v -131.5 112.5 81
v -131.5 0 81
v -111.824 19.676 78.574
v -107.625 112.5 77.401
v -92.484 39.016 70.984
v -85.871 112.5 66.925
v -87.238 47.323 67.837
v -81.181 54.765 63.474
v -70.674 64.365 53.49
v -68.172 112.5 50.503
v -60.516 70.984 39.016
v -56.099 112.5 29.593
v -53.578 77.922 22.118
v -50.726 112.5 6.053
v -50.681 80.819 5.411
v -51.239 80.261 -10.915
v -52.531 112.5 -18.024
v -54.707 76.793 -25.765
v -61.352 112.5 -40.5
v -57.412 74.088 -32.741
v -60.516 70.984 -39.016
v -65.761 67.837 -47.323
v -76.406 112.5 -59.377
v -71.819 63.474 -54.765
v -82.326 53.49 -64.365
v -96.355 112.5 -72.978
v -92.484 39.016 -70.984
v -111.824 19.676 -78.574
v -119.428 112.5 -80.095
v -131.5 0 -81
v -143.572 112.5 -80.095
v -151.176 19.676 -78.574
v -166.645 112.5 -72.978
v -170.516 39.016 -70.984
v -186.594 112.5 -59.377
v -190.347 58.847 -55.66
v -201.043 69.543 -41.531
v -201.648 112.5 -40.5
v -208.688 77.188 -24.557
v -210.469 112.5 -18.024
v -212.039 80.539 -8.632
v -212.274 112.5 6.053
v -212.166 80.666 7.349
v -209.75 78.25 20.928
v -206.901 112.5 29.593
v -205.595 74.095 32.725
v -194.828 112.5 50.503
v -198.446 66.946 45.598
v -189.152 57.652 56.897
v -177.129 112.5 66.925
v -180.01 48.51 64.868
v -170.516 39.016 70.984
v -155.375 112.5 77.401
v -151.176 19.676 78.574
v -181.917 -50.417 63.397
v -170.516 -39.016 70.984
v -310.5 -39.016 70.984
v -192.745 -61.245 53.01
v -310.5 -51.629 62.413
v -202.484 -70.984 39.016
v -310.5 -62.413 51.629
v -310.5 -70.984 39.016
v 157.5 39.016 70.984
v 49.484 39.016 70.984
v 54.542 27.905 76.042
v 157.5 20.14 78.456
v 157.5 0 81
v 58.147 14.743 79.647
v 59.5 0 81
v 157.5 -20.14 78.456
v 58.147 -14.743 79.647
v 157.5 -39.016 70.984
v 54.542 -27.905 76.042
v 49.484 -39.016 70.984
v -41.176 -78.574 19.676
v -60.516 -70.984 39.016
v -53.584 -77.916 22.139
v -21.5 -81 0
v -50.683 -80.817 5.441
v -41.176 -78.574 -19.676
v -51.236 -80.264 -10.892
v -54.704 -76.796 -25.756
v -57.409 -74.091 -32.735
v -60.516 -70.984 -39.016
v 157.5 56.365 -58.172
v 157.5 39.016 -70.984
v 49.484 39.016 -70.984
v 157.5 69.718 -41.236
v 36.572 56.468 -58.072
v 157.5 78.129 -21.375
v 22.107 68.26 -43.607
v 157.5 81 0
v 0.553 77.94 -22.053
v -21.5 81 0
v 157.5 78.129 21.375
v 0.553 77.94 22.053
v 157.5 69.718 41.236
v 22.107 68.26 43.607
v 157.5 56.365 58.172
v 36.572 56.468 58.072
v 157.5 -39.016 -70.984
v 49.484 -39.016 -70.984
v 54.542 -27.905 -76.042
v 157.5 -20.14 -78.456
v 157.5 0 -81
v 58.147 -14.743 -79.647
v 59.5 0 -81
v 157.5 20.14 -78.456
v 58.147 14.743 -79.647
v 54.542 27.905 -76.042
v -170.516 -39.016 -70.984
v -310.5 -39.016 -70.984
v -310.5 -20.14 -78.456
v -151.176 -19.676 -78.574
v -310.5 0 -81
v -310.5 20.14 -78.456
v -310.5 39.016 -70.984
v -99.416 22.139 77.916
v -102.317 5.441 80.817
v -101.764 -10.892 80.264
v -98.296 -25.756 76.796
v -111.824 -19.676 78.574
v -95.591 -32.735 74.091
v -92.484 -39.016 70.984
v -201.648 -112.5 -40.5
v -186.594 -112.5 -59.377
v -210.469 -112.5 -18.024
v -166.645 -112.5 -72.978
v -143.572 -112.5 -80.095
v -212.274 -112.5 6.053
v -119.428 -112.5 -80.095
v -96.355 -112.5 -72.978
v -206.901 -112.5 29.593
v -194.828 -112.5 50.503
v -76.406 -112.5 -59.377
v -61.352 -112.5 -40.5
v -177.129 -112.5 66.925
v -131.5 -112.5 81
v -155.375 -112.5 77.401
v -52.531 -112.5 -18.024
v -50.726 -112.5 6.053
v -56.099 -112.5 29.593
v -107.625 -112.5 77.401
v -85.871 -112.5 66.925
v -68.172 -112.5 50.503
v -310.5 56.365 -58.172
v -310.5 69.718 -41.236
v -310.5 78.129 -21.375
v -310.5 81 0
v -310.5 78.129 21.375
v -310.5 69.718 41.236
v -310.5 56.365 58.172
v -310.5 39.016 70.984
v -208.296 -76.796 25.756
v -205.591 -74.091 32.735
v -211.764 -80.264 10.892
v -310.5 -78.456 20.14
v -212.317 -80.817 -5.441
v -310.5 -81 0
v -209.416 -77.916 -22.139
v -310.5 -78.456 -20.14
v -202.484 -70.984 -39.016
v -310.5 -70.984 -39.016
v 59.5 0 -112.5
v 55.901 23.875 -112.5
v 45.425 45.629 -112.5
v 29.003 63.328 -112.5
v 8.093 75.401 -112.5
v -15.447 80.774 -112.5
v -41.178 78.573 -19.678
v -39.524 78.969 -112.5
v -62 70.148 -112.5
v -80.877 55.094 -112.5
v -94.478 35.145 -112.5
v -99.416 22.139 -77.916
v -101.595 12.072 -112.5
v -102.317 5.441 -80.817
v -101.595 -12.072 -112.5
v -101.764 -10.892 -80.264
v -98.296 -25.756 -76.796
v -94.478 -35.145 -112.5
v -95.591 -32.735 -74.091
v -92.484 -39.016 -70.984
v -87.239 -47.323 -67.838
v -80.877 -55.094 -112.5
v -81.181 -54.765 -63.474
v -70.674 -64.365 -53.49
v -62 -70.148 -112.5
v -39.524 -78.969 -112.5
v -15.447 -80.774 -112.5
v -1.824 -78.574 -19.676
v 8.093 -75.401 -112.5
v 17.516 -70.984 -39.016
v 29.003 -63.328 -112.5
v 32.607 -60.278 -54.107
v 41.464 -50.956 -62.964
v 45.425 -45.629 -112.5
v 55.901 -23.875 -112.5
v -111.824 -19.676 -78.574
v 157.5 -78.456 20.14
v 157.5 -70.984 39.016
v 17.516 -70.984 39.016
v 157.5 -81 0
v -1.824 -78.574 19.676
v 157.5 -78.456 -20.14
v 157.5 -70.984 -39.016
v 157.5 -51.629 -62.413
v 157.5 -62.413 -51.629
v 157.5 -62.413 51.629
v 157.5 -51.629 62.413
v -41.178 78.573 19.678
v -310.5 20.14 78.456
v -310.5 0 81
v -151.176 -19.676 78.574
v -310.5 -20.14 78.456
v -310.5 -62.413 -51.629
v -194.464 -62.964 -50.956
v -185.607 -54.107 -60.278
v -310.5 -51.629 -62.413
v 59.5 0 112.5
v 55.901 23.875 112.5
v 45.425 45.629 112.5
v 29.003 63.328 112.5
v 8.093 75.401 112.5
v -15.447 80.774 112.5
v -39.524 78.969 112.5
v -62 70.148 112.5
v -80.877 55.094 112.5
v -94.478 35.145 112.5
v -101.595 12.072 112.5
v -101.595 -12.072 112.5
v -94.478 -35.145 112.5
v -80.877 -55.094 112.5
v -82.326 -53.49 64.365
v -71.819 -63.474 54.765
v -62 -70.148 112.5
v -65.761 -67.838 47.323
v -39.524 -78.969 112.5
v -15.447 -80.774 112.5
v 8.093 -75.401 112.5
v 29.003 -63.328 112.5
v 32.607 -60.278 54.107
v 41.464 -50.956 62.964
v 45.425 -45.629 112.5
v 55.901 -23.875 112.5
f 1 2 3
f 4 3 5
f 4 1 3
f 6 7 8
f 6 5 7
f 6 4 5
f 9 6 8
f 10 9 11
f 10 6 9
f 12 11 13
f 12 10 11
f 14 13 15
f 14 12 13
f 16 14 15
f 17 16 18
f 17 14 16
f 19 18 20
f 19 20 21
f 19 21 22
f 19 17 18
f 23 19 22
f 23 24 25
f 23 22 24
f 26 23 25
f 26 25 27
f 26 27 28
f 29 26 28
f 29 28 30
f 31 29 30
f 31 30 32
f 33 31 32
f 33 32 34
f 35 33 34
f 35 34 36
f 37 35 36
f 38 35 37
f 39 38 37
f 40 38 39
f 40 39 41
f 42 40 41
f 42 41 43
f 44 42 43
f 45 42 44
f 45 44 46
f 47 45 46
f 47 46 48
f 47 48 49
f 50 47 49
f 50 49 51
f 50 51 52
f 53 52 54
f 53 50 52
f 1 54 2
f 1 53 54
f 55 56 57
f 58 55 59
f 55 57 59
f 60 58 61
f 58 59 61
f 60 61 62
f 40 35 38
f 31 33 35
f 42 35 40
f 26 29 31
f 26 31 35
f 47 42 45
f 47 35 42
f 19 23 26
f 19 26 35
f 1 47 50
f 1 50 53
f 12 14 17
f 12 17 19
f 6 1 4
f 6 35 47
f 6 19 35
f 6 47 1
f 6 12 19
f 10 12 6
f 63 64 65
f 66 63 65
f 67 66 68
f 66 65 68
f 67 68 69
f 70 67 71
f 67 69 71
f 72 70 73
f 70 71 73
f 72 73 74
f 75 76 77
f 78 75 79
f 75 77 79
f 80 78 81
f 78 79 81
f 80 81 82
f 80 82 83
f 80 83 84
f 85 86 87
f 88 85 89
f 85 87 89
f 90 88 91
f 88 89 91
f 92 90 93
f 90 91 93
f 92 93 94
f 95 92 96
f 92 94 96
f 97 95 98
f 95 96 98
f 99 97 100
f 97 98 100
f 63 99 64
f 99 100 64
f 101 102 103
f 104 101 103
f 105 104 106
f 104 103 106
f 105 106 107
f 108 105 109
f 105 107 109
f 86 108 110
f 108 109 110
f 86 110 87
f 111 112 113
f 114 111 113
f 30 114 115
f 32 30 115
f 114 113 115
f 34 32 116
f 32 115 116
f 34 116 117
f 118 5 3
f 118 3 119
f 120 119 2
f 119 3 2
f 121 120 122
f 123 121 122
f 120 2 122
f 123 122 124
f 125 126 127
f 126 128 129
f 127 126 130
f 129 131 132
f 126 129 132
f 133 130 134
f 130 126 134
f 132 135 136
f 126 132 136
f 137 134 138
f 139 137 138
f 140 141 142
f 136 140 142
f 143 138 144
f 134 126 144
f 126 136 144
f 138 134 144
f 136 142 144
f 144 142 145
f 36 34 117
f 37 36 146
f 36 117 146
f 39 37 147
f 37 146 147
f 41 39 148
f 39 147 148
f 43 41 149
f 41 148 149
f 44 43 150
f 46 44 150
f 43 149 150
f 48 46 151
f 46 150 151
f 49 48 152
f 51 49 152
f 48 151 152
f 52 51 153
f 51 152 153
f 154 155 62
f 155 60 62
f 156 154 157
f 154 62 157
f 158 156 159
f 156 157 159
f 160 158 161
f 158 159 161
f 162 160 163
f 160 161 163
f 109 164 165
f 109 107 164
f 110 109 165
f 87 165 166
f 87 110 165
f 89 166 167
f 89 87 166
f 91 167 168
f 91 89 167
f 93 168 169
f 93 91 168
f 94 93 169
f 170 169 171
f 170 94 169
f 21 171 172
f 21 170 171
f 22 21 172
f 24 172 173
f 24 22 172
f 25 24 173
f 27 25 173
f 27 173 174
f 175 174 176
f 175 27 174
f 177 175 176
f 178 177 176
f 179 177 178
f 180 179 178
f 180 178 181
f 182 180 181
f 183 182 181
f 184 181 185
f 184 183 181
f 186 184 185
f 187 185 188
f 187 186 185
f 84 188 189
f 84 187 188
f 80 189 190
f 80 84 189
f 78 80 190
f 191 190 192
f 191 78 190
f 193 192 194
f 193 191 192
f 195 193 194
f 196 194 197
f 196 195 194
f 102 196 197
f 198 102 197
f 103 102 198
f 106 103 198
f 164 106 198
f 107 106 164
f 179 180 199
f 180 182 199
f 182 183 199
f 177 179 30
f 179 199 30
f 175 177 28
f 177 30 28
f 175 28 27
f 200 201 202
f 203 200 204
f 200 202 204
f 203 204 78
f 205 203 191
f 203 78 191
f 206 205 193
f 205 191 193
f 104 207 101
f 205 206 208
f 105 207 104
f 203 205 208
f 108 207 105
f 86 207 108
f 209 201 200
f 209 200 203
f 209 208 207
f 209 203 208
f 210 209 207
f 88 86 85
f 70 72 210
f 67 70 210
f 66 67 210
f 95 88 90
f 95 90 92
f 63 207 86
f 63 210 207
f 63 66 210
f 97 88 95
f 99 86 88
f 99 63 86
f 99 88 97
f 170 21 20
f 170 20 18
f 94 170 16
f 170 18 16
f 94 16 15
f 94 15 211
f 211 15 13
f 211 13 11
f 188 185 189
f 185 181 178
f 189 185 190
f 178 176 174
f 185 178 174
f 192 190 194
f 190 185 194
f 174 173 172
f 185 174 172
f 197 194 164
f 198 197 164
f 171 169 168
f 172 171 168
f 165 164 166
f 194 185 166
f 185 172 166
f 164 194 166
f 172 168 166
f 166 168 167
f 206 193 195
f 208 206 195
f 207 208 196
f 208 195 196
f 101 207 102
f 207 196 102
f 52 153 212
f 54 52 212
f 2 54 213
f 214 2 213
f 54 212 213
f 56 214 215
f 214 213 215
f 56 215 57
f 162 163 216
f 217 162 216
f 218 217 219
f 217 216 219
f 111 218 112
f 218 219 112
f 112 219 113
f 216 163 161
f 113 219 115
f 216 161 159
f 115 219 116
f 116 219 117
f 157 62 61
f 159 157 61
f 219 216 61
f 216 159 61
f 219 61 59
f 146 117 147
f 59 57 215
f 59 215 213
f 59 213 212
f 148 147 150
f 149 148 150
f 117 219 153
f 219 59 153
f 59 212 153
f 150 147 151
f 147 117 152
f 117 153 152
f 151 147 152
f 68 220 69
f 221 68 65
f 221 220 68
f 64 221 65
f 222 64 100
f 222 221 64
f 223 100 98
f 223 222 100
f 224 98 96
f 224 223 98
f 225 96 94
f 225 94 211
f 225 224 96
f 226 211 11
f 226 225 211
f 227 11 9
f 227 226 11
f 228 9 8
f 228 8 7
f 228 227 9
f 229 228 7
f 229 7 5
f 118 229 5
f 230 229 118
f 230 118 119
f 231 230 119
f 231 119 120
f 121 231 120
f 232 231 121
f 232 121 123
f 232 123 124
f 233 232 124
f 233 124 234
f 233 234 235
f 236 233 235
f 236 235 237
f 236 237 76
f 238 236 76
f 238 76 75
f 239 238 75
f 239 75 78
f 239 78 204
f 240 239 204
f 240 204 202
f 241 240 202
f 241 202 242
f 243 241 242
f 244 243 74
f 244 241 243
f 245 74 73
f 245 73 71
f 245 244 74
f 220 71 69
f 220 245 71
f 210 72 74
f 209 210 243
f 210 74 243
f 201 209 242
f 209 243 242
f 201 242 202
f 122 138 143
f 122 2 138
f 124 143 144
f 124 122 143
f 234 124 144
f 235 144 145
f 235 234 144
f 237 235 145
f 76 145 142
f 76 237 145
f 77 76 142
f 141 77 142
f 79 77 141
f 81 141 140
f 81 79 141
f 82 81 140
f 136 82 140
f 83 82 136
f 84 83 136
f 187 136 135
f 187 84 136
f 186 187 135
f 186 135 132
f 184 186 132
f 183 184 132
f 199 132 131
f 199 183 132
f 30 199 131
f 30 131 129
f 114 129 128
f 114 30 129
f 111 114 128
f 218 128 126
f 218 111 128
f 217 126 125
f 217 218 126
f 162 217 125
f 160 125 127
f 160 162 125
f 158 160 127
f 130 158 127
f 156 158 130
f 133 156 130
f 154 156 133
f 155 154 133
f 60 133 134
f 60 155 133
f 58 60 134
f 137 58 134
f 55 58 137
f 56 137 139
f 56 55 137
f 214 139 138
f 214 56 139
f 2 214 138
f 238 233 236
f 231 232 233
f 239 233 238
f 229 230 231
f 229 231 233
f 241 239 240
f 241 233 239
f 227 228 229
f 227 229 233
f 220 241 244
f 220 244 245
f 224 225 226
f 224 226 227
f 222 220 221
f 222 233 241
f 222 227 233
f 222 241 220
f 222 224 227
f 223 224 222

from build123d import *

# Parameters (mm, degrees)
CROQUIS2_R              = 81
SALIENTE_EXTRUIR1_DEPTH = 112.5
CROQUIS3_R              = 81
SALIENTE_EXTRUIR2_DEPTH = 112.5
CROQUIS3D7_R            = 81
SALIENTE_EXTRUIR3_DEPTH = 468


with BuildPart() as part:
    # Croquis2 → Saliente-Extruir1 (new, symmetric)
    with BuildSketch(Plane(origin=(0, 0, 0), x_dir=(1, 0, 0), z_dir=(0, 1, 0))):
        with Locations((-131.5, 0)):
            Circle(CROQUIS2_R)
    extrude(amount=SALIENTE_EXTRUIR1_DEPTH, both=True)

    # Croquis3 → Saliente-Extruir2 (add, symmetric)
    with BuildSketch(Plane.XY):
        with Locations((-21.5, 0)):
            Circle(CROQUIS3_R)
    extrude(amount=SALIENTE_EXTRUIR2_DEPTH, both=True)

    # Croquis3D7 → Saliente-Extruir3 (add)
    with BuildSketch(Plane(origin=(157.5, 0, 0), x_dir=(0, 0, 1), z_dir=(1, 0, 0))):
        Circle(CROQUIS3D7_R)
    extrude(amount=-SALIENTE_EXTRUIR3_DEPTH)


solid = part.part
